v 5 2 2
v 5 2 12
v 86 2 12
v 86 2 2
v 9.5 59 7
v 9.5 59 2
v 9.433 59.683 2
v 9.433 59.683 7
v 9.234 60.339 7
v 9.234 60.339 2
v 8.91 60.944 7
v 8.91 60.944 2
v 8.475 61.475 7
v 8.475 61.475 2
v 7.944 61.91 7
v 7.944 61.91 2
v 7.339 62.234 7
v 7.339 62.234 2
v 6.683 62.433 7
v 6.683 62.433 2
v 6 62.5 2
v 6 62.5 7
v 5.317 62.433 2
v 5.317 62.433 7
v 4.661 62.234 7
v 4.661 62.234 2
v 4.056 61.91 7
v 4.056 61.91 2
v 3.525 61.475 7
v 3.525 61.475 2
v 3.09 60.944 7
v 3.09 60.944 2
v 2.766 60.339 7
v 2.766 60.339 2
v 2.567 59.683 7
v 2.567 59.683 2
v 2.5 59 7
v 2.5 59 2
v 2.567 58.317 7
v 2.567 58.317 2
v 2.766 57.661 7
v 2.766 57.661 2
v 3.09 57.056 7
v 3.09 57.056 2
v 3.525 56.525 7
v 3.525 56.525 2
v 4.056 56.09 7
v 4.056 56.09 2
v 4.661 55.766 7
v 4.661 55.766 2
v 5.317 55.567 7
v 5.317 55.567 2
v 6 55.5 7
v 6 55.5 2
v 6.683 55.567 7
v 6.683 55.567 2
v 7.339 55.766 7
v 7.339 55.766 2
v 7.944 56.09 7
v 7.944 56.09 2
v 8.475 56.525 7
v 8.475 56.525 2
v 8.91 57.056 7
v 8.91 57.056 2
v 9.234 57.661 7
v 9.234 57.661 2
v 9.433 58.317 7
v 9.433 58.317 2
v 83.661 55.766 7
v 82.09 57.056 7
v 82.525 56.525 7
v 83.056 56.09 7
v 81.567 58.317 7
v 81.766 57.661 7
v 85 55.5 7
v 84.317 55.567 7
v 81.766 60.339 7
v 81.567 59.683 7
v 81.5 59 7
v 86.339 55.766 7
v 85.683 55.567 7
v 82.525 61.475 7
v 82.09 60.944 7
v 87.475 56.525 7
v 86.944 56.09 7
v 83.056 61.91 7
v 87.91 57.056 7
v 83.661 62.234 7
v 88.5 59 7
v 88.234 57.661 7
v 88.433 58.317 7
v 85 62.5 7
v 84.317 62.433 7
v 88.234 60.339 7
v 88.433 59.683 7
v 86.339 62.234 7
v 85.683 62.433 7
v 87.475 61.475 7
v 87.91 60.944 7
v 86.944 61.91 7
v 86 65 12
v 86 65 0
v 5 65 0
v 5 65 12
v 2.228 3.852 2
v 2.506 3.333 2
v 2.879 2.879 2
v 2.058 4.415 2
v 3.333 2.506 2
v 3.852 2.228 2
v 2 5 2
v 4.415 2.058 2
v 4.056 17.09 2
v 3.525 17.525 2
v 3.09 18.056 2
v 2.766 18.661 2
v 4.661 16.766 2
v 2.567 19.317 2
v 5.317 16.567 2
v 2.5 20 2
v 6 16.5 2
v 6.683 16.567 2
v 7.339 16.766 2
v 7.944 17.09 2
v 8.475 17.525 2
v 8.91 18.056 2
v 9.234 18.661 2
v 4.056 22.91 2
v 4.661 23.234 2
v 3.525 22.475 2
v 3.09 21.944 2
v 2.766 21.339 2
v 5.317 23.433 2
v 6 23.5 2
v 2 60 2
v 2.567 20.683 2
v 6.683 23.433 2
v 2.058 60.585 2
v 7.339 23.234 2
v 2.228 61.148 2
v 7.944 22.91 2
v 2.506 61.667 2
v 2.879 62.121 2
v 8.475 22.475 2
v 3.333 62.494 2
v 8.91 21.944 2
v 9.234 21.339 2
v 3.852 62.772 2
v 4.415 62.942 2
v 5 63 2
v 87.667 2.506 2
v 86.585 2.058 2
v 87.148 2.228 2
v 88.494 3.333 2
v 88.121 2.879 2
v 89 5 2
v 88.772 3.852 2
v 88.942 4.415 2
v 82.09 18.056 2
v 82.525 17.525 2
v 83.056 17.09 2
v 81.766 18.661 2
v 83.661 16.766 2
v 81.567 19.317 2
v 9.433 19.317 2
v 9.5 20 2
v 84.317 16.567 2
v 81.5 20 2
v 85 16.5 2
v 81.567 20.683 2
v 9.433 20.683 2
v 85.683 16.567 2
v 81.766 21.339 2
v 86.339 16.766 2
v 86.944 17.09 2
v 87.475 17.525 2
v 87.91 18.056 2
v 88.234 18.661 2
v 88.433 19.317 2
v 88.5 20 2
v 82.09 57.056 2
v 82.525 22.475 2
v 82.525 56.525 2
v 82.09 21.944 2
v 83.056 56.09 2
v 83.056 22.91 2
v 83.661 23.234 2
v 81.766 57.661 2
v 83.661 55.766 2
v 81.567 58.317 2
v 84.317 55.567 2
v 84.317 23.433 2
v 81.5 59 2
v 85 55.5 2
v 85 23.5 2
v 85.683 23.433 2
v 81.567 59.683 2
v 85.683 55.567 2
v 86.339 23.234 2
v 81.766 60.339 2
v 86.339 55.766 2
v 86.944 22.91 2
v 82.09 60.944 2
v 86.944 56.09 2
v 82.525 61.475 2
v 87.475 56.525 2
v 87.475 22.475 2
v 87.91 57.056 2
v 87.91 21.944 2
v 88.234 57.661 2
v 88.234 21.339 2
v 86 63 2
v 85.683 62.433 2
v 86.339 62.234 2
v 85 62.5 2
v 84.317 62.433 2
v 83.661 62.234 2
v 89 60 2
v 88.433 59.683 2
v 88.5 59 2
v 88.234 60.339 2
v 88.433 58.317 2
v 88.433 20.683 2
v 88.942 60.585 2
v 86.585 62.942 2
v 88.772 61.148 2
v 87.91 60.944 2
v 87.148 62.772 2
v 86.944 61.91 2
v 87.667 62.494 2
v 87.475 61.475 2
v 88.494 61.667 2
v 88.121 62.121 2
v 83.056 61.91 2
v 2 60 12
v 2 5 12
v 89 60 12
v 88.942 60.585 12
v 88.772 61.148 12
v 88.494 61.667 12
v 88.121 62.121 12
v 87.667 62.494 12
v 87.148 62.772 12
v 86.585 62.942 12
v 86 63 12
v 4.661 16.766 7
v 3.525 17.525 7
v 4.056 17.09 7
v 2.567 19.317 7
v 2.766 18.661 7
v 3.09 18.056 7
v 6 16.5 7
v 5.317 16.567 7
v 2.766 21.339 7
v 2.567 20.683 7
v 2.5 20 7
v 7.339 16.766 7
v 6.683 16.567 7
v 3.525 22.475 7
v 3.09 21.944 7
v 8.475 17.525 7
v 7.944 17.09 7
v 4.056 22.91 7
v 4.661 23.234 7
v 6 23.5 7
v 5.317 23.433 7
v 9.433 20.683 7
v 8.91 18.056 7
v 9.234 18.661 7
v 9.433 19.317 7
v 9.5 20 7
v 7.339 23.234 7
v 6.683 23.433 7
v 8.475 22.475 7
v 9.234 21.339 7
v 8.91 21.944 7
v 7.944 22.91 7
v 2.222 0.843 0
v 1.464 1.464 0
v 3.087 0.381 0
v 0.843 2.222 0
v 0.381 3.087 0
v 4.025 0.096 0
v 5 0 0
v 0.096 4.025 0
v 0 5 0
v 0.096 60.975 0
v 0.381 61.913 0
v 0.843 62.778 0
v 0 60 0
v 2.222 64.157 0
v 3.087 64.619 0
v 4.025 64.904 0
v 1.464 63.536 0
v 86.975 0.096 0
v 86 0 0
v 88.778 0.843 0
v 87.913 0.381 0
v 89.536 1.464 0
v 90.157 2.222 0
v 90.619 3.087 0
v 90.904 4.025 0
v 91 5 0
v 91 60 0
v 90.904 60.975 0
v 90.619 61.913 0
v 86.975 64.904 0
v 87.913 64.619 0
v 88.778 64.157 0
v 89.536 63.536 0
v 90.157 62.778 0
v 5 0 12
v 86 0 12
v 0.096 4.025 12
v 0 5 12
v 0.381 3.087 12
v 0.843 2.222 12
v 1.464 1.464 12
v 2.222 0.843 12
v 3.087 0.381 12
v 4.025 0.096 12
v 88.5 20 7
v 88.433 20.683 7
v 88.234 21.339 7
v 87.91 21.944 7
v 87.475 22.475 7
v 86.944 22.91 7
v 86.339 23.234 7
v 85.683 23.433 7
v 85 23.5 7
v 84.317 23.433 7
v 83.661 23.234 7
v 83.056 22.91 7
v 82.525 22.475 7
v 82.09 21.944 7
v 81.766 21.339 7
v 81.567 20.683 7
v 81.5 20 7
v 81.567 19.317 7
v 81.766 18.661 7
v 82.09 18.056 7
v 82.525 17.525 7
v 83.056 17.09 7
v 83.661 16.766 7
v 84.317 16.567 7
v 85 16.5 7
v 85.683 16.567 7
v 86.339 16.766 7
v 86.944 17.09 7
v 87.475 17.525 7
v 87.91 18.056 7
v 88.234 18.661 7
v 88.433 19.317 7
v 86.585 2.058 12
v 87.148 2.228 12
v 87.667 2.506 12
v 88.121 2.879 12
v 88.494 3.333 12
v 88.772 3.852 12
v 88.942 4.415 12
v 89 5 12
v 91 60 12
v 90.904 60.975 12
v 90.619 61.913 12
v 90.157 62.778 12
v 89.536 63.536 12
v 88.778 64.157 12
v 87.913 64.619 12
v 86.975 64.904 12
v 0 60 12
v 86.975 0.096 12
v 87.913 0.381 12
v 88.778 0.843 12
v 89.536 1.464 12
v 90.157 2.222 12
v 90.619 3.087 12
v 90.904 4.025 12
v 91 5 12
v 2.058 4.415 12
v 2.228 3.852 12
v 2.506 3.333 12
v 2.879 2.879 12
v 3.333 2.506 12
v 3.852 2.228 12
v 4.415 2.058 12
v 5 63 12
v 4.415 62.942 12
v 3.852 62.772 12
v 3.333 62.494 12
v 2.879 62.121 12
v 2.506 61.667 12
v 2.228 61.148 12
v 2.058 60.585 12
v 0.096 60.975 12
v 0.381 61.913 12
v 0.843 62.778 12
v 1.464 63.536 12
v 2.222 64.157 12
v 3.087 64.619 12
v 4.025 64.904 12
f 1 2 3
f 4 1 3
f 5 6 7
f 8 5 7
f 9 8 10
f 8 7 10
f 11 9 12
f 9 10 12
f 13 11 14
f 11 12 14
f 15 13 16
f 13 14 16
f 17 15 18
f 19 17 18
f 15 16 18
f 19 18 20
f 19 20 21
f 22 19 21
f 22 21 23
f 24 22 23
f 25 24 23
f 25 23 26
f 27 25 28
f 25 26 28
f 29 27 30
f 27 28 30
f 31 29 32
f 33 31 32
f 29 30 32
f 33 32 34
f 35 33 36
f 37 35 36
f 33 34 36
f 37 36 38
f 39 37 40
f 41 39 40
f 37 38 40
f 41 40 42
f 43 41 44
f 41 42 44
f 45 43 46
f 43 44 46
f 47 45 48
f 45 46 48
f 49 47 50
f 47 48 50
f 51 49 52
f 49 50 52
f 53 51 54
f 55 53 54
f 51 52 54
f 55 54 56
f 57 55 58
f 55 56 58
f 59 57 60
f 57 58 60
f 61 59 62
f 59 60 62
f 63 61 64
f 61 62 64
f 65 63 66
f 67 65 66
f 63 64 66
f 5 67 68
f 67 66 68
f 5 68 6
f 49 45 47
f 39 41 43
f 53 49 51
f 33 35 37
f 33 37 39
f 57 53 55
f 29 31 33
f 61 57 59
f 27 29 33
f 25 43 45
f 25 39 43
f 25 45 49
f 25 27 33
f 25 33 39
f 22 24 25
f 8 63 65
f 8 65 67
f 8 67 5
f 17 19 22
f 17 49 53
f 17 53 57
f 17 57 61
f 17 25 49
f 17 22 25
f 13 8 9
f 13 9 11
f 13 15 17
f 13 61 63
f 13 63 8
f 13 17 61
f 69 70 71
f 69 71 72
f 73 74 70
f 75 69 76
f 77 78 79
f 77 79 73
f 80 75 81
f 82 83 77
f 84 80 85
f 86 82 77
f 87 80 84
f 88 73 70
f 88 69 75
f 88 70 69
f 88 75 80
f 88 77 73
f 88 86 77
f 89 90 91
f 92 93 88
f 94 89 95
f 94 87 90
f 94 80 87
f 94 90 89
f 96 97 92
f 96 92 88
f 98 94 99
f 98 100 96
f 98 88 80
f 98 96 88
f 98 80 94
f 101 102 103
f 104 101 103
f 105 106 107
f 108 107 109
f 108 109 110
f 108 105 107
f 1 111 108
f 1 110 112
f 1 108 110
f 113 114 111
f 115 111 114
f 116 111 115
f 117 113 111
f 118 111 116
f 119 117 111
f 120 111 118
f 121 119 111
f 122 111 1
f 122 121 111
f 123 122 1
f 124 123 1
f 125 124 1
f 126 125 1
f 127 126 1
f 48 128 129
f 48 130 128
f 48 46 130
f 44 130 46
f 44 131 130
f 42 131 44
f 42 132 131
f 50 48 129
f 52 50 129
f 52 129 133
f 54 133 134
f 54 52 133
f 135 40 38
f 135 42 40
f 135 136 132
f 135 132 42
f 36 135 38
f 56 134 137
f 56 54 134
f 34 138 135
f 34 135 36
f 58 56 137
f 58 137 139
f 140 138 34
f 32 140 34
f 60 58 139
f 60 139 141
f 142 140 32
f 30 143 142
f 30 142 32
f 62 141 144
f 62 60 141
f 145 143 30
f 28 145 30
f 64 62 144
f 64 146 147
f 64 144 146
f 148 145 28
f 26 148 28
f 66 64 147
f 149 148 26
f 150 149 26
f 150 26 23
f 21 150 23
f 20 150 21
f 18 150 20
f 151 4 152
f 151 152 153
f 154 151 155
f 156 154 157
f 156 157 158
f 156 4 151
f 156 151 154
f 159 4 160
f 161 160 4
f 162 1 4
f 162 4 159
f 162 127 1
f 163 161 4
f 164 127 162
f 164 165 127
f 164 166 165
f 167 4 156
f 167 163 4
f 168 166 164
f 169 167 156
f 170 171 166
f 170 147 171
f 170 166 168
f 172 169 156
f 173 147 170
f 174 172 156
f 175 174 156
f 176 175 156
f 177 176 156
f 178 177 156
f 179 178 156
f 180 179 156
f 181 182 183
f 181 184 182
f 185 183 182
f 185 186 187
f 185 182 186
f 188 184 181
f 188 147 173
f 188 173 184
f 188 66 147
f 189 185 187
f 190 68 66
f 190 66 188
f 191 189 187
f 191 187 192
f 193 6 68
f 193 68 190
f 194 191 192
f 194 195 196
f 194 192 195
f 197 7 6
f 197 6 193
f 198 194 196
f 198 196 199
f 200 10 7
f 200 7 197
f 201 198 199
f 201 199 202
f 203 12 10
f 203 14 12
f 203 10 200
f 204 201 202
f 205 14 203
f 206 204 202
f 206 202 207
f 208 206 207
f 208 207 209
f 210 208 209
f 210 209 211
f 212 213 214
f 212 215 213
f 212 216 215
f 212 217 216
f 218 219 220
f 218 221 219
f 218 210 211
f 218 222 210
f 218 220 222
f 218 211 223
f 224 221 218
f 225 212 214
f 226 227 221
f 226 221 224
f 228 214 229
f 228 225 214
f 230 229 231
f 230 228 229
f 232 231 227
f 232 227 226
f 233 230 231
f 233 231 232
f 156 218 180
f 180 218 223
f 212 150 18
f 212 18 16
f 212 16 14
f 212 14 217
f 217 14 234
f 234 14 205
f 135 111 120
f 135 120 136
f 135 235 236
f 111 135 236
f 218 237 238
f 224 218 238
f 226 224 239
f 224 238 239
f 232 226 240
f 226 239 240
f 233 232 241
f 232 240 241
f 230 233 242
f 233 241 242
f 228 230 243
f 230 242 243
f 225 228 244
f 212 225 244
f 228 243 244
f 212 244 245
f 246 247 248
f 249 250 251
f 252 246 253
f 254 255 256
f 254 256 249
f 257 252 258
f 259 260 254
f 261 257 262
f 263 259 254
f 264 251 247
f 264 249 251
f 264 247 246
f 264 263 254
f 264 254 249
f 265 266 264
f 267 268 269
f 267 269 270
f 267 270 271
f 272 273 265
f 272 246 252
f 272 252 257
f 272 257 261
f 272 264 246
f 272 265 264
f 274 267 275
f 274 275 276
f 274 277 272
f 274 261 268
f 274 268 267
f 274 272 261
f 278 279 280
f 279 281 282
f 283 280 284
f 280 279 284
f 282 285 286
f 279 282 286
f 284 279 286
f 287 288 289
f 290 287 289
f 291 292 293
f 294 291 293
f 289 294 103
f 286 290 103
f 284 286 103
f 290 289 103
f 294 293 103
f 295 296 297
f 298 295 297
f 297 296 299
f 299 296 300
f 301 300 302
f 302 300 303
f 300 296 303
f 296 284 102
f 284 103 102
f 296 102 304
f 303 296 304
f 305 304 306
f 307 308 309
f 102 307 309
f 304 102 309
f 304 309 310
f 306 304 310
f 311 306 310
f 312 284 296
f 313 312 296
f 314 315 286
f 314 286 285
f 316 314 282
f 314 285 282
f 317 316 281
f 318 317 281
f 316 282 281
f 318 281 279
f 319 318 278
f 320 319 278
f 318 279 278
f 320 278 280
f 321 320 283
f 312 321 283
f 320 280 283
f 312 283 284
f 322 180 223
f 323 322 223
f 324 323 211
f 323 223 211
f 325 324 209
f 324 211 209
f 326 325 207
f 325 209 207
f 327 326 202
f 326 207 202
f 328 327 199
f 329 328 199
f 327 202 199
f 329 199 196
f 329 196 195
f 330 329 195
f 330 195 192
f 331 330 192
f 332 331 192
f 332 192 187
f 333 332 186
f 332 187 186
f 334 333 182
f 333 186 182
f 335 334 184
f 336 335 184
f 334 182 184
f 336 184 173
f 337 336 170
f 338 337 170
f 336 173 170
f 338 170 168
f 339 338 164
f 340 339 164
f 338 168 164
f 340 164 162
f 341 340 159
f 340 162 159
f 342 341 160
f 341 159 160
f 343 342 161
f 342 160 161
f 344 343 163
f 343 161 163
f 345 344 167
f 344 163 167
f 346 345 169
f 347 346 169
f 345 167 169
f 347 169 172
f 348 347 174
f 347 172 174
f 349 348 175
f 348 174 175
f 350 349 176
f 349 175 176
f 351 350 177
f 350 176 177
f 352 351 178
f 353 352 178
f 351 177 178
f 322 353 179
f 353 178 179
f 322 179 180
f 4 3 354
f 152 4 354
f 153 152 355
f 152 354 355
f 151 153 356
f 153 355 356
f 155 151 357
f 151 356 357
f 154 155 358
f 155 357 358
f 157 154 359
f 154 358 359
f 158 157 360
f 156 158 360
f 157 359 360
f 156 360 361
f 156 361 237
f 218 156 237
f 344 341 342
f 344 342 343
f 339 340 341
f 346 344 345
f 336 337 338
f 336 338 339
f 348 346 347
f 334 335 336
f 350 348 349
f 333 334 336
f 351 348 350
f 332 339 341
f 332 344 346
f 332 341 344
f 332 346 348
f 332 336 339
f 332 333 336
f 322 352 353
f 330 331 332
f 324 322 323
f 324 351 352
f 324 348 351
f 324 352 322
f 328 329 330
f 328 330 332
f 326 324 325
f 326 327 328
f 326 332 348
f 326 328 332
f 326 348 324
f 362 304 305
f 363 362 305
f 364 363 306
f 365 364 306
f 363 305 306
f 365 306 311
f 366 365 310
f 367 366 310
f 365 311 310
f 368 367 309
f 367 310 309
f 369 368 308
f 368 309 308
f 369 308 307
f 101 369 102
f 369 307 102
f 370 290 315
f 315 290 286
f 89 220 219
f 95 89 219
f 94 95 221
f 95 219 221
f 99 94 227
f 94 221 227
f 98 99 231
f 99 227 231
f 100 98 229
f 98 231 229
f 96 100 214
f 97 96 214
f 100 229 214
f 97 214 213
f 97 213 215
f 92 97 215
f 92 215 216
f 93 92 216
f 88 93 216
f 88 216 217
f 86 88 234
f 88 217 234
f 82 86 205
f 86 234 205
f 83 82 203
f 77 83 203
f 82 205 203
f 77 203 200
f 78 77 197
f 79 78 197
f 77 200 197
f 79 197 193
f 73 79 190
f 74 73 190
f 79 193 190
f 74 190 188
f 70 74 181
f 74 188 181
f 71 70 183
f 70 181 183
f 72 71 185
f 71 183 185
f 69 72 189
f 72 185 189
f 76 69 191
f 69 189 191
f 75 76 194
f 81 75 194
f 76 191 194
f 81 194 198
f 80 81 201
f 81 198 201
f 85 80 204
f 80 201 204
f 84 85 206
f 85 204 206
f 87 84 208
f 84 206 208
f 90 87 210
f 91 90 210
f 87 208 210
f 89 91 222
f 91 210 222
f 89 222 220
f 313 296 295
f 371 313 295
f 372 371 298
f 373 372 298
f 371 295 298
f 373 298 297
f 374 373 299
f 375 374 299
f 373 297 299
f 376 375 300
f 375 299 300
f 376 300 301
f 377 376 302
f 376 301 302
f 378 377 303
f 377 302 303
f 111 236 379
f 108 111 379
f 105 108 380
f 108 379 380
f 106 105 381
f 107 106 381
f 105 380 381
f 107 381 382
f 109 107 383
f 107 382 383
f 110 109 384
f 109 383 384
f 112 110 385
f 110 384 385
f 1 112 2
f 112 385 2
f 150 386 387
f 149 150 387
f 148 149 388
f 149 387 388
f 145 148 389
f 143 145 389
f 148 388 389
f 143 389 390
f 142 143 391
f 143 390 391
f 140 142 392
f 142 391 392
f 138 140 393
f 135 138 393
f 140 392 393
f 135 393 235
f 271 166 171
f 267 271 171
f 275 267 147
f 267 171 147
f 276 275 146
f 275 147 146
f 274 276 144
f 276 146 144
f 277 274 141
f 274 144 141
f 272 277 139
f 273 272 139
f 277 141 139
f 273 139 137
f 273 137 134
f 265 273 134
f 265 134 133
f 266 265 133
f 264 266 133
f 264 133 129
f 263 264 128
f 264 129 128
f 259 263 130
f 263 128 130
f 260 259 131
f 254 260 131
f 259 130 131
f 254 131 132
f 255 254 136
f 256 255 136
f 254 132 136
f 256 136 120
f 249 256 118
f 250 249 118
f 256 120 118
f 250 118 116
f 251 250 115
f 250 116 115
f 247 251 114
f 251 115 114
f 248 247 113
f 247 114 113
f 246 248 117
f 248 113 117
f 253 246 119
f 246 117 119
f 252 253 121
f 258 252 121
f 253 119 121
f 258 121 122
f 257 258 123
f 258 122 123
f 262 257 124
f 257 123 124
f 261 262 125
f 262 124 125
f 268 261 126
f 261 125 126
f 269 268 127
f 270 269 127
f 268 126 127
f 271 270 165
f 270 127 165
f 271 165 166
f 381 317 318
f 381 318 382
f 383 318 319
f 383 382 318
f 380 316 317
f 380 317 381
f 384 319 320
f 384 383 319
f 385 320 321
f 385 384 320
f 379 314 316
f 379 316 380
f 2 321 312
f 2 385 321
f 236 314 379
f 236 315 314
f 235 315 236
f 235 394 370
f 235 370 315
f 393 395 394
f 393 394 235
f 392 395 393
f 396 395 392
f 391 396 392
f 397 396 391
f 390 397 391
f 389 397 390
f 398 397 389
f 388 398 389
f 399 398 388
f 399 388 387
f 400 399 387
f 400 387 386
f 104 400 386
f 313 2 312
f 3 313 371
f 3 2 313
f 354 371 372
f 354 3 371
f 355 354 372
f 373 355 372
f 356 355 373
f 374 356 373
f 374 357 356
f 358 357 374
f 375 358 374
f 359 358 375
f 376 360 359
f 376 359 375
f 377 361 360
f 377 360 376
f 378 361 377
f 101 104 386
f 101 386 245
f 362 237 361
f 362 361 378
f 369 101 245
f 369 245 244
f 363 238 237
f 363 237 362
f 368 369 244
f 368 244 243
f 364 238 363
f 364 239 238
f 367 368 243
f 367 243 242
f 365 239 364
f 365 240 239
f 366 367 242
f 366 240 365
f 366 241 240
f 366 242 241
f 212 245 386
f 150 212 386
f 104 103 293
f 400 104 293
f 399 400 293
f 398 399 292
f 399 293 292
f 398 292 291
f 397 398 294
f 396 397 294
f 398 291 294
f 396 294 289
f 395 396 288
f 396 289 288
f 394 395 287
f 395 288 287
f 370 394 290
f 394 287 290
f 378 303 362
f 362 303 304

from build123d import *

# Parameters (mm, degrees)
PAD_DEPTH                    = 12
POCKET_DEPTH                 = 10
SKETCH003_R                  = 3.5
PAD001_DEPTH                 = 5
SKETCH003_LINEARPATTERN_2_R  = 3.5
PAD001_LINEARPATTERN_2_DEPTH = 5
LINEARPATTERN001_COUNT       = 2
LINEARPATTERN001_PITCH       = 39


with BuildPart() as part:
    # Sketch → Pad (new body)
    with BuildSketch(Plane.XY):
        with BuildLine():
            Line((5, 0), (86, 0))
            ThreePointArc((86, 0), (89.535534, 1.464466), (91, 5))
            Line((91, 5), (91, 60))
            ThreePointArc((91, 60), (89.535534, 63.535534), (86, 65))
            Line((86, 65), (5, 65))
            ThreePointArc((5, 65), (1.464466, 63.535534), (0, 60))
            Line((0, 60), (0, 5))
            ThreePointArc((0, 5), (1.464466, 1.464466), (5, 0))
        make_face()
    extrude(amount=PAD_DEPTH)

    # Sketch002 → Pocket (cut)
    with BuildSketch(Plane.XY.offset(12)):
        with BuildLine():
            Line((5, 2), (86, 2))
            ThreePointArc((86, 2), (88.12132, 2.87868), (89, 5))
            Line((89, 5), (89, 60))
            ThreePointArc((89, 60), (88.12132, 62.12132), (86, 63))
            Line((86, 63), (5, 63))
            ThreePointArc((5, 63), (2.87868, 62.12132), (2, 60))
            Line((2, 60), (2, 5))
            ThreePointArc((2, 5), (2.87868, 2.87868), (5, 2))
        make_face()
    extrude(amount=-POCKET_DEPTH, mode=Mode.SUBTRACT)

    # Sketch003 → Pad001 (join)
    with BuildSketch(Plane.XY.offset(2)):
        with Locations((6, 20)):
            Circle(SKETCH003_R)
    pad001 = extrude(amount=PAD001_DEPTH)

    # Sketch003 LinearPattern 2 → Pad001 LinearPattern 2 (add)
    with BuildSketch(Plane(origin=(79, 0, 2), x_dir=(1, 0, 0), z_dir=(0, 0, 1))):
        with Locations((6, 20)):
            Circle(SKETCH003_LINEARPATTERN_2_R)
    pad001_linearpattern_2 = extrude(amount=PAD001_LINEARPATTERN_2_DEPTH)

    # LinearPattern001: Pad001, Pad001 LinearPattern 2 ×2
    with Locations(*[(0, i * LINEARPATTERN001_PITCH, 0) for i in range(1, LINEARPATTERN001_COUNT)]):
        add(pad001)
        add(pad001_linearpattern_2)


solid = part.part
